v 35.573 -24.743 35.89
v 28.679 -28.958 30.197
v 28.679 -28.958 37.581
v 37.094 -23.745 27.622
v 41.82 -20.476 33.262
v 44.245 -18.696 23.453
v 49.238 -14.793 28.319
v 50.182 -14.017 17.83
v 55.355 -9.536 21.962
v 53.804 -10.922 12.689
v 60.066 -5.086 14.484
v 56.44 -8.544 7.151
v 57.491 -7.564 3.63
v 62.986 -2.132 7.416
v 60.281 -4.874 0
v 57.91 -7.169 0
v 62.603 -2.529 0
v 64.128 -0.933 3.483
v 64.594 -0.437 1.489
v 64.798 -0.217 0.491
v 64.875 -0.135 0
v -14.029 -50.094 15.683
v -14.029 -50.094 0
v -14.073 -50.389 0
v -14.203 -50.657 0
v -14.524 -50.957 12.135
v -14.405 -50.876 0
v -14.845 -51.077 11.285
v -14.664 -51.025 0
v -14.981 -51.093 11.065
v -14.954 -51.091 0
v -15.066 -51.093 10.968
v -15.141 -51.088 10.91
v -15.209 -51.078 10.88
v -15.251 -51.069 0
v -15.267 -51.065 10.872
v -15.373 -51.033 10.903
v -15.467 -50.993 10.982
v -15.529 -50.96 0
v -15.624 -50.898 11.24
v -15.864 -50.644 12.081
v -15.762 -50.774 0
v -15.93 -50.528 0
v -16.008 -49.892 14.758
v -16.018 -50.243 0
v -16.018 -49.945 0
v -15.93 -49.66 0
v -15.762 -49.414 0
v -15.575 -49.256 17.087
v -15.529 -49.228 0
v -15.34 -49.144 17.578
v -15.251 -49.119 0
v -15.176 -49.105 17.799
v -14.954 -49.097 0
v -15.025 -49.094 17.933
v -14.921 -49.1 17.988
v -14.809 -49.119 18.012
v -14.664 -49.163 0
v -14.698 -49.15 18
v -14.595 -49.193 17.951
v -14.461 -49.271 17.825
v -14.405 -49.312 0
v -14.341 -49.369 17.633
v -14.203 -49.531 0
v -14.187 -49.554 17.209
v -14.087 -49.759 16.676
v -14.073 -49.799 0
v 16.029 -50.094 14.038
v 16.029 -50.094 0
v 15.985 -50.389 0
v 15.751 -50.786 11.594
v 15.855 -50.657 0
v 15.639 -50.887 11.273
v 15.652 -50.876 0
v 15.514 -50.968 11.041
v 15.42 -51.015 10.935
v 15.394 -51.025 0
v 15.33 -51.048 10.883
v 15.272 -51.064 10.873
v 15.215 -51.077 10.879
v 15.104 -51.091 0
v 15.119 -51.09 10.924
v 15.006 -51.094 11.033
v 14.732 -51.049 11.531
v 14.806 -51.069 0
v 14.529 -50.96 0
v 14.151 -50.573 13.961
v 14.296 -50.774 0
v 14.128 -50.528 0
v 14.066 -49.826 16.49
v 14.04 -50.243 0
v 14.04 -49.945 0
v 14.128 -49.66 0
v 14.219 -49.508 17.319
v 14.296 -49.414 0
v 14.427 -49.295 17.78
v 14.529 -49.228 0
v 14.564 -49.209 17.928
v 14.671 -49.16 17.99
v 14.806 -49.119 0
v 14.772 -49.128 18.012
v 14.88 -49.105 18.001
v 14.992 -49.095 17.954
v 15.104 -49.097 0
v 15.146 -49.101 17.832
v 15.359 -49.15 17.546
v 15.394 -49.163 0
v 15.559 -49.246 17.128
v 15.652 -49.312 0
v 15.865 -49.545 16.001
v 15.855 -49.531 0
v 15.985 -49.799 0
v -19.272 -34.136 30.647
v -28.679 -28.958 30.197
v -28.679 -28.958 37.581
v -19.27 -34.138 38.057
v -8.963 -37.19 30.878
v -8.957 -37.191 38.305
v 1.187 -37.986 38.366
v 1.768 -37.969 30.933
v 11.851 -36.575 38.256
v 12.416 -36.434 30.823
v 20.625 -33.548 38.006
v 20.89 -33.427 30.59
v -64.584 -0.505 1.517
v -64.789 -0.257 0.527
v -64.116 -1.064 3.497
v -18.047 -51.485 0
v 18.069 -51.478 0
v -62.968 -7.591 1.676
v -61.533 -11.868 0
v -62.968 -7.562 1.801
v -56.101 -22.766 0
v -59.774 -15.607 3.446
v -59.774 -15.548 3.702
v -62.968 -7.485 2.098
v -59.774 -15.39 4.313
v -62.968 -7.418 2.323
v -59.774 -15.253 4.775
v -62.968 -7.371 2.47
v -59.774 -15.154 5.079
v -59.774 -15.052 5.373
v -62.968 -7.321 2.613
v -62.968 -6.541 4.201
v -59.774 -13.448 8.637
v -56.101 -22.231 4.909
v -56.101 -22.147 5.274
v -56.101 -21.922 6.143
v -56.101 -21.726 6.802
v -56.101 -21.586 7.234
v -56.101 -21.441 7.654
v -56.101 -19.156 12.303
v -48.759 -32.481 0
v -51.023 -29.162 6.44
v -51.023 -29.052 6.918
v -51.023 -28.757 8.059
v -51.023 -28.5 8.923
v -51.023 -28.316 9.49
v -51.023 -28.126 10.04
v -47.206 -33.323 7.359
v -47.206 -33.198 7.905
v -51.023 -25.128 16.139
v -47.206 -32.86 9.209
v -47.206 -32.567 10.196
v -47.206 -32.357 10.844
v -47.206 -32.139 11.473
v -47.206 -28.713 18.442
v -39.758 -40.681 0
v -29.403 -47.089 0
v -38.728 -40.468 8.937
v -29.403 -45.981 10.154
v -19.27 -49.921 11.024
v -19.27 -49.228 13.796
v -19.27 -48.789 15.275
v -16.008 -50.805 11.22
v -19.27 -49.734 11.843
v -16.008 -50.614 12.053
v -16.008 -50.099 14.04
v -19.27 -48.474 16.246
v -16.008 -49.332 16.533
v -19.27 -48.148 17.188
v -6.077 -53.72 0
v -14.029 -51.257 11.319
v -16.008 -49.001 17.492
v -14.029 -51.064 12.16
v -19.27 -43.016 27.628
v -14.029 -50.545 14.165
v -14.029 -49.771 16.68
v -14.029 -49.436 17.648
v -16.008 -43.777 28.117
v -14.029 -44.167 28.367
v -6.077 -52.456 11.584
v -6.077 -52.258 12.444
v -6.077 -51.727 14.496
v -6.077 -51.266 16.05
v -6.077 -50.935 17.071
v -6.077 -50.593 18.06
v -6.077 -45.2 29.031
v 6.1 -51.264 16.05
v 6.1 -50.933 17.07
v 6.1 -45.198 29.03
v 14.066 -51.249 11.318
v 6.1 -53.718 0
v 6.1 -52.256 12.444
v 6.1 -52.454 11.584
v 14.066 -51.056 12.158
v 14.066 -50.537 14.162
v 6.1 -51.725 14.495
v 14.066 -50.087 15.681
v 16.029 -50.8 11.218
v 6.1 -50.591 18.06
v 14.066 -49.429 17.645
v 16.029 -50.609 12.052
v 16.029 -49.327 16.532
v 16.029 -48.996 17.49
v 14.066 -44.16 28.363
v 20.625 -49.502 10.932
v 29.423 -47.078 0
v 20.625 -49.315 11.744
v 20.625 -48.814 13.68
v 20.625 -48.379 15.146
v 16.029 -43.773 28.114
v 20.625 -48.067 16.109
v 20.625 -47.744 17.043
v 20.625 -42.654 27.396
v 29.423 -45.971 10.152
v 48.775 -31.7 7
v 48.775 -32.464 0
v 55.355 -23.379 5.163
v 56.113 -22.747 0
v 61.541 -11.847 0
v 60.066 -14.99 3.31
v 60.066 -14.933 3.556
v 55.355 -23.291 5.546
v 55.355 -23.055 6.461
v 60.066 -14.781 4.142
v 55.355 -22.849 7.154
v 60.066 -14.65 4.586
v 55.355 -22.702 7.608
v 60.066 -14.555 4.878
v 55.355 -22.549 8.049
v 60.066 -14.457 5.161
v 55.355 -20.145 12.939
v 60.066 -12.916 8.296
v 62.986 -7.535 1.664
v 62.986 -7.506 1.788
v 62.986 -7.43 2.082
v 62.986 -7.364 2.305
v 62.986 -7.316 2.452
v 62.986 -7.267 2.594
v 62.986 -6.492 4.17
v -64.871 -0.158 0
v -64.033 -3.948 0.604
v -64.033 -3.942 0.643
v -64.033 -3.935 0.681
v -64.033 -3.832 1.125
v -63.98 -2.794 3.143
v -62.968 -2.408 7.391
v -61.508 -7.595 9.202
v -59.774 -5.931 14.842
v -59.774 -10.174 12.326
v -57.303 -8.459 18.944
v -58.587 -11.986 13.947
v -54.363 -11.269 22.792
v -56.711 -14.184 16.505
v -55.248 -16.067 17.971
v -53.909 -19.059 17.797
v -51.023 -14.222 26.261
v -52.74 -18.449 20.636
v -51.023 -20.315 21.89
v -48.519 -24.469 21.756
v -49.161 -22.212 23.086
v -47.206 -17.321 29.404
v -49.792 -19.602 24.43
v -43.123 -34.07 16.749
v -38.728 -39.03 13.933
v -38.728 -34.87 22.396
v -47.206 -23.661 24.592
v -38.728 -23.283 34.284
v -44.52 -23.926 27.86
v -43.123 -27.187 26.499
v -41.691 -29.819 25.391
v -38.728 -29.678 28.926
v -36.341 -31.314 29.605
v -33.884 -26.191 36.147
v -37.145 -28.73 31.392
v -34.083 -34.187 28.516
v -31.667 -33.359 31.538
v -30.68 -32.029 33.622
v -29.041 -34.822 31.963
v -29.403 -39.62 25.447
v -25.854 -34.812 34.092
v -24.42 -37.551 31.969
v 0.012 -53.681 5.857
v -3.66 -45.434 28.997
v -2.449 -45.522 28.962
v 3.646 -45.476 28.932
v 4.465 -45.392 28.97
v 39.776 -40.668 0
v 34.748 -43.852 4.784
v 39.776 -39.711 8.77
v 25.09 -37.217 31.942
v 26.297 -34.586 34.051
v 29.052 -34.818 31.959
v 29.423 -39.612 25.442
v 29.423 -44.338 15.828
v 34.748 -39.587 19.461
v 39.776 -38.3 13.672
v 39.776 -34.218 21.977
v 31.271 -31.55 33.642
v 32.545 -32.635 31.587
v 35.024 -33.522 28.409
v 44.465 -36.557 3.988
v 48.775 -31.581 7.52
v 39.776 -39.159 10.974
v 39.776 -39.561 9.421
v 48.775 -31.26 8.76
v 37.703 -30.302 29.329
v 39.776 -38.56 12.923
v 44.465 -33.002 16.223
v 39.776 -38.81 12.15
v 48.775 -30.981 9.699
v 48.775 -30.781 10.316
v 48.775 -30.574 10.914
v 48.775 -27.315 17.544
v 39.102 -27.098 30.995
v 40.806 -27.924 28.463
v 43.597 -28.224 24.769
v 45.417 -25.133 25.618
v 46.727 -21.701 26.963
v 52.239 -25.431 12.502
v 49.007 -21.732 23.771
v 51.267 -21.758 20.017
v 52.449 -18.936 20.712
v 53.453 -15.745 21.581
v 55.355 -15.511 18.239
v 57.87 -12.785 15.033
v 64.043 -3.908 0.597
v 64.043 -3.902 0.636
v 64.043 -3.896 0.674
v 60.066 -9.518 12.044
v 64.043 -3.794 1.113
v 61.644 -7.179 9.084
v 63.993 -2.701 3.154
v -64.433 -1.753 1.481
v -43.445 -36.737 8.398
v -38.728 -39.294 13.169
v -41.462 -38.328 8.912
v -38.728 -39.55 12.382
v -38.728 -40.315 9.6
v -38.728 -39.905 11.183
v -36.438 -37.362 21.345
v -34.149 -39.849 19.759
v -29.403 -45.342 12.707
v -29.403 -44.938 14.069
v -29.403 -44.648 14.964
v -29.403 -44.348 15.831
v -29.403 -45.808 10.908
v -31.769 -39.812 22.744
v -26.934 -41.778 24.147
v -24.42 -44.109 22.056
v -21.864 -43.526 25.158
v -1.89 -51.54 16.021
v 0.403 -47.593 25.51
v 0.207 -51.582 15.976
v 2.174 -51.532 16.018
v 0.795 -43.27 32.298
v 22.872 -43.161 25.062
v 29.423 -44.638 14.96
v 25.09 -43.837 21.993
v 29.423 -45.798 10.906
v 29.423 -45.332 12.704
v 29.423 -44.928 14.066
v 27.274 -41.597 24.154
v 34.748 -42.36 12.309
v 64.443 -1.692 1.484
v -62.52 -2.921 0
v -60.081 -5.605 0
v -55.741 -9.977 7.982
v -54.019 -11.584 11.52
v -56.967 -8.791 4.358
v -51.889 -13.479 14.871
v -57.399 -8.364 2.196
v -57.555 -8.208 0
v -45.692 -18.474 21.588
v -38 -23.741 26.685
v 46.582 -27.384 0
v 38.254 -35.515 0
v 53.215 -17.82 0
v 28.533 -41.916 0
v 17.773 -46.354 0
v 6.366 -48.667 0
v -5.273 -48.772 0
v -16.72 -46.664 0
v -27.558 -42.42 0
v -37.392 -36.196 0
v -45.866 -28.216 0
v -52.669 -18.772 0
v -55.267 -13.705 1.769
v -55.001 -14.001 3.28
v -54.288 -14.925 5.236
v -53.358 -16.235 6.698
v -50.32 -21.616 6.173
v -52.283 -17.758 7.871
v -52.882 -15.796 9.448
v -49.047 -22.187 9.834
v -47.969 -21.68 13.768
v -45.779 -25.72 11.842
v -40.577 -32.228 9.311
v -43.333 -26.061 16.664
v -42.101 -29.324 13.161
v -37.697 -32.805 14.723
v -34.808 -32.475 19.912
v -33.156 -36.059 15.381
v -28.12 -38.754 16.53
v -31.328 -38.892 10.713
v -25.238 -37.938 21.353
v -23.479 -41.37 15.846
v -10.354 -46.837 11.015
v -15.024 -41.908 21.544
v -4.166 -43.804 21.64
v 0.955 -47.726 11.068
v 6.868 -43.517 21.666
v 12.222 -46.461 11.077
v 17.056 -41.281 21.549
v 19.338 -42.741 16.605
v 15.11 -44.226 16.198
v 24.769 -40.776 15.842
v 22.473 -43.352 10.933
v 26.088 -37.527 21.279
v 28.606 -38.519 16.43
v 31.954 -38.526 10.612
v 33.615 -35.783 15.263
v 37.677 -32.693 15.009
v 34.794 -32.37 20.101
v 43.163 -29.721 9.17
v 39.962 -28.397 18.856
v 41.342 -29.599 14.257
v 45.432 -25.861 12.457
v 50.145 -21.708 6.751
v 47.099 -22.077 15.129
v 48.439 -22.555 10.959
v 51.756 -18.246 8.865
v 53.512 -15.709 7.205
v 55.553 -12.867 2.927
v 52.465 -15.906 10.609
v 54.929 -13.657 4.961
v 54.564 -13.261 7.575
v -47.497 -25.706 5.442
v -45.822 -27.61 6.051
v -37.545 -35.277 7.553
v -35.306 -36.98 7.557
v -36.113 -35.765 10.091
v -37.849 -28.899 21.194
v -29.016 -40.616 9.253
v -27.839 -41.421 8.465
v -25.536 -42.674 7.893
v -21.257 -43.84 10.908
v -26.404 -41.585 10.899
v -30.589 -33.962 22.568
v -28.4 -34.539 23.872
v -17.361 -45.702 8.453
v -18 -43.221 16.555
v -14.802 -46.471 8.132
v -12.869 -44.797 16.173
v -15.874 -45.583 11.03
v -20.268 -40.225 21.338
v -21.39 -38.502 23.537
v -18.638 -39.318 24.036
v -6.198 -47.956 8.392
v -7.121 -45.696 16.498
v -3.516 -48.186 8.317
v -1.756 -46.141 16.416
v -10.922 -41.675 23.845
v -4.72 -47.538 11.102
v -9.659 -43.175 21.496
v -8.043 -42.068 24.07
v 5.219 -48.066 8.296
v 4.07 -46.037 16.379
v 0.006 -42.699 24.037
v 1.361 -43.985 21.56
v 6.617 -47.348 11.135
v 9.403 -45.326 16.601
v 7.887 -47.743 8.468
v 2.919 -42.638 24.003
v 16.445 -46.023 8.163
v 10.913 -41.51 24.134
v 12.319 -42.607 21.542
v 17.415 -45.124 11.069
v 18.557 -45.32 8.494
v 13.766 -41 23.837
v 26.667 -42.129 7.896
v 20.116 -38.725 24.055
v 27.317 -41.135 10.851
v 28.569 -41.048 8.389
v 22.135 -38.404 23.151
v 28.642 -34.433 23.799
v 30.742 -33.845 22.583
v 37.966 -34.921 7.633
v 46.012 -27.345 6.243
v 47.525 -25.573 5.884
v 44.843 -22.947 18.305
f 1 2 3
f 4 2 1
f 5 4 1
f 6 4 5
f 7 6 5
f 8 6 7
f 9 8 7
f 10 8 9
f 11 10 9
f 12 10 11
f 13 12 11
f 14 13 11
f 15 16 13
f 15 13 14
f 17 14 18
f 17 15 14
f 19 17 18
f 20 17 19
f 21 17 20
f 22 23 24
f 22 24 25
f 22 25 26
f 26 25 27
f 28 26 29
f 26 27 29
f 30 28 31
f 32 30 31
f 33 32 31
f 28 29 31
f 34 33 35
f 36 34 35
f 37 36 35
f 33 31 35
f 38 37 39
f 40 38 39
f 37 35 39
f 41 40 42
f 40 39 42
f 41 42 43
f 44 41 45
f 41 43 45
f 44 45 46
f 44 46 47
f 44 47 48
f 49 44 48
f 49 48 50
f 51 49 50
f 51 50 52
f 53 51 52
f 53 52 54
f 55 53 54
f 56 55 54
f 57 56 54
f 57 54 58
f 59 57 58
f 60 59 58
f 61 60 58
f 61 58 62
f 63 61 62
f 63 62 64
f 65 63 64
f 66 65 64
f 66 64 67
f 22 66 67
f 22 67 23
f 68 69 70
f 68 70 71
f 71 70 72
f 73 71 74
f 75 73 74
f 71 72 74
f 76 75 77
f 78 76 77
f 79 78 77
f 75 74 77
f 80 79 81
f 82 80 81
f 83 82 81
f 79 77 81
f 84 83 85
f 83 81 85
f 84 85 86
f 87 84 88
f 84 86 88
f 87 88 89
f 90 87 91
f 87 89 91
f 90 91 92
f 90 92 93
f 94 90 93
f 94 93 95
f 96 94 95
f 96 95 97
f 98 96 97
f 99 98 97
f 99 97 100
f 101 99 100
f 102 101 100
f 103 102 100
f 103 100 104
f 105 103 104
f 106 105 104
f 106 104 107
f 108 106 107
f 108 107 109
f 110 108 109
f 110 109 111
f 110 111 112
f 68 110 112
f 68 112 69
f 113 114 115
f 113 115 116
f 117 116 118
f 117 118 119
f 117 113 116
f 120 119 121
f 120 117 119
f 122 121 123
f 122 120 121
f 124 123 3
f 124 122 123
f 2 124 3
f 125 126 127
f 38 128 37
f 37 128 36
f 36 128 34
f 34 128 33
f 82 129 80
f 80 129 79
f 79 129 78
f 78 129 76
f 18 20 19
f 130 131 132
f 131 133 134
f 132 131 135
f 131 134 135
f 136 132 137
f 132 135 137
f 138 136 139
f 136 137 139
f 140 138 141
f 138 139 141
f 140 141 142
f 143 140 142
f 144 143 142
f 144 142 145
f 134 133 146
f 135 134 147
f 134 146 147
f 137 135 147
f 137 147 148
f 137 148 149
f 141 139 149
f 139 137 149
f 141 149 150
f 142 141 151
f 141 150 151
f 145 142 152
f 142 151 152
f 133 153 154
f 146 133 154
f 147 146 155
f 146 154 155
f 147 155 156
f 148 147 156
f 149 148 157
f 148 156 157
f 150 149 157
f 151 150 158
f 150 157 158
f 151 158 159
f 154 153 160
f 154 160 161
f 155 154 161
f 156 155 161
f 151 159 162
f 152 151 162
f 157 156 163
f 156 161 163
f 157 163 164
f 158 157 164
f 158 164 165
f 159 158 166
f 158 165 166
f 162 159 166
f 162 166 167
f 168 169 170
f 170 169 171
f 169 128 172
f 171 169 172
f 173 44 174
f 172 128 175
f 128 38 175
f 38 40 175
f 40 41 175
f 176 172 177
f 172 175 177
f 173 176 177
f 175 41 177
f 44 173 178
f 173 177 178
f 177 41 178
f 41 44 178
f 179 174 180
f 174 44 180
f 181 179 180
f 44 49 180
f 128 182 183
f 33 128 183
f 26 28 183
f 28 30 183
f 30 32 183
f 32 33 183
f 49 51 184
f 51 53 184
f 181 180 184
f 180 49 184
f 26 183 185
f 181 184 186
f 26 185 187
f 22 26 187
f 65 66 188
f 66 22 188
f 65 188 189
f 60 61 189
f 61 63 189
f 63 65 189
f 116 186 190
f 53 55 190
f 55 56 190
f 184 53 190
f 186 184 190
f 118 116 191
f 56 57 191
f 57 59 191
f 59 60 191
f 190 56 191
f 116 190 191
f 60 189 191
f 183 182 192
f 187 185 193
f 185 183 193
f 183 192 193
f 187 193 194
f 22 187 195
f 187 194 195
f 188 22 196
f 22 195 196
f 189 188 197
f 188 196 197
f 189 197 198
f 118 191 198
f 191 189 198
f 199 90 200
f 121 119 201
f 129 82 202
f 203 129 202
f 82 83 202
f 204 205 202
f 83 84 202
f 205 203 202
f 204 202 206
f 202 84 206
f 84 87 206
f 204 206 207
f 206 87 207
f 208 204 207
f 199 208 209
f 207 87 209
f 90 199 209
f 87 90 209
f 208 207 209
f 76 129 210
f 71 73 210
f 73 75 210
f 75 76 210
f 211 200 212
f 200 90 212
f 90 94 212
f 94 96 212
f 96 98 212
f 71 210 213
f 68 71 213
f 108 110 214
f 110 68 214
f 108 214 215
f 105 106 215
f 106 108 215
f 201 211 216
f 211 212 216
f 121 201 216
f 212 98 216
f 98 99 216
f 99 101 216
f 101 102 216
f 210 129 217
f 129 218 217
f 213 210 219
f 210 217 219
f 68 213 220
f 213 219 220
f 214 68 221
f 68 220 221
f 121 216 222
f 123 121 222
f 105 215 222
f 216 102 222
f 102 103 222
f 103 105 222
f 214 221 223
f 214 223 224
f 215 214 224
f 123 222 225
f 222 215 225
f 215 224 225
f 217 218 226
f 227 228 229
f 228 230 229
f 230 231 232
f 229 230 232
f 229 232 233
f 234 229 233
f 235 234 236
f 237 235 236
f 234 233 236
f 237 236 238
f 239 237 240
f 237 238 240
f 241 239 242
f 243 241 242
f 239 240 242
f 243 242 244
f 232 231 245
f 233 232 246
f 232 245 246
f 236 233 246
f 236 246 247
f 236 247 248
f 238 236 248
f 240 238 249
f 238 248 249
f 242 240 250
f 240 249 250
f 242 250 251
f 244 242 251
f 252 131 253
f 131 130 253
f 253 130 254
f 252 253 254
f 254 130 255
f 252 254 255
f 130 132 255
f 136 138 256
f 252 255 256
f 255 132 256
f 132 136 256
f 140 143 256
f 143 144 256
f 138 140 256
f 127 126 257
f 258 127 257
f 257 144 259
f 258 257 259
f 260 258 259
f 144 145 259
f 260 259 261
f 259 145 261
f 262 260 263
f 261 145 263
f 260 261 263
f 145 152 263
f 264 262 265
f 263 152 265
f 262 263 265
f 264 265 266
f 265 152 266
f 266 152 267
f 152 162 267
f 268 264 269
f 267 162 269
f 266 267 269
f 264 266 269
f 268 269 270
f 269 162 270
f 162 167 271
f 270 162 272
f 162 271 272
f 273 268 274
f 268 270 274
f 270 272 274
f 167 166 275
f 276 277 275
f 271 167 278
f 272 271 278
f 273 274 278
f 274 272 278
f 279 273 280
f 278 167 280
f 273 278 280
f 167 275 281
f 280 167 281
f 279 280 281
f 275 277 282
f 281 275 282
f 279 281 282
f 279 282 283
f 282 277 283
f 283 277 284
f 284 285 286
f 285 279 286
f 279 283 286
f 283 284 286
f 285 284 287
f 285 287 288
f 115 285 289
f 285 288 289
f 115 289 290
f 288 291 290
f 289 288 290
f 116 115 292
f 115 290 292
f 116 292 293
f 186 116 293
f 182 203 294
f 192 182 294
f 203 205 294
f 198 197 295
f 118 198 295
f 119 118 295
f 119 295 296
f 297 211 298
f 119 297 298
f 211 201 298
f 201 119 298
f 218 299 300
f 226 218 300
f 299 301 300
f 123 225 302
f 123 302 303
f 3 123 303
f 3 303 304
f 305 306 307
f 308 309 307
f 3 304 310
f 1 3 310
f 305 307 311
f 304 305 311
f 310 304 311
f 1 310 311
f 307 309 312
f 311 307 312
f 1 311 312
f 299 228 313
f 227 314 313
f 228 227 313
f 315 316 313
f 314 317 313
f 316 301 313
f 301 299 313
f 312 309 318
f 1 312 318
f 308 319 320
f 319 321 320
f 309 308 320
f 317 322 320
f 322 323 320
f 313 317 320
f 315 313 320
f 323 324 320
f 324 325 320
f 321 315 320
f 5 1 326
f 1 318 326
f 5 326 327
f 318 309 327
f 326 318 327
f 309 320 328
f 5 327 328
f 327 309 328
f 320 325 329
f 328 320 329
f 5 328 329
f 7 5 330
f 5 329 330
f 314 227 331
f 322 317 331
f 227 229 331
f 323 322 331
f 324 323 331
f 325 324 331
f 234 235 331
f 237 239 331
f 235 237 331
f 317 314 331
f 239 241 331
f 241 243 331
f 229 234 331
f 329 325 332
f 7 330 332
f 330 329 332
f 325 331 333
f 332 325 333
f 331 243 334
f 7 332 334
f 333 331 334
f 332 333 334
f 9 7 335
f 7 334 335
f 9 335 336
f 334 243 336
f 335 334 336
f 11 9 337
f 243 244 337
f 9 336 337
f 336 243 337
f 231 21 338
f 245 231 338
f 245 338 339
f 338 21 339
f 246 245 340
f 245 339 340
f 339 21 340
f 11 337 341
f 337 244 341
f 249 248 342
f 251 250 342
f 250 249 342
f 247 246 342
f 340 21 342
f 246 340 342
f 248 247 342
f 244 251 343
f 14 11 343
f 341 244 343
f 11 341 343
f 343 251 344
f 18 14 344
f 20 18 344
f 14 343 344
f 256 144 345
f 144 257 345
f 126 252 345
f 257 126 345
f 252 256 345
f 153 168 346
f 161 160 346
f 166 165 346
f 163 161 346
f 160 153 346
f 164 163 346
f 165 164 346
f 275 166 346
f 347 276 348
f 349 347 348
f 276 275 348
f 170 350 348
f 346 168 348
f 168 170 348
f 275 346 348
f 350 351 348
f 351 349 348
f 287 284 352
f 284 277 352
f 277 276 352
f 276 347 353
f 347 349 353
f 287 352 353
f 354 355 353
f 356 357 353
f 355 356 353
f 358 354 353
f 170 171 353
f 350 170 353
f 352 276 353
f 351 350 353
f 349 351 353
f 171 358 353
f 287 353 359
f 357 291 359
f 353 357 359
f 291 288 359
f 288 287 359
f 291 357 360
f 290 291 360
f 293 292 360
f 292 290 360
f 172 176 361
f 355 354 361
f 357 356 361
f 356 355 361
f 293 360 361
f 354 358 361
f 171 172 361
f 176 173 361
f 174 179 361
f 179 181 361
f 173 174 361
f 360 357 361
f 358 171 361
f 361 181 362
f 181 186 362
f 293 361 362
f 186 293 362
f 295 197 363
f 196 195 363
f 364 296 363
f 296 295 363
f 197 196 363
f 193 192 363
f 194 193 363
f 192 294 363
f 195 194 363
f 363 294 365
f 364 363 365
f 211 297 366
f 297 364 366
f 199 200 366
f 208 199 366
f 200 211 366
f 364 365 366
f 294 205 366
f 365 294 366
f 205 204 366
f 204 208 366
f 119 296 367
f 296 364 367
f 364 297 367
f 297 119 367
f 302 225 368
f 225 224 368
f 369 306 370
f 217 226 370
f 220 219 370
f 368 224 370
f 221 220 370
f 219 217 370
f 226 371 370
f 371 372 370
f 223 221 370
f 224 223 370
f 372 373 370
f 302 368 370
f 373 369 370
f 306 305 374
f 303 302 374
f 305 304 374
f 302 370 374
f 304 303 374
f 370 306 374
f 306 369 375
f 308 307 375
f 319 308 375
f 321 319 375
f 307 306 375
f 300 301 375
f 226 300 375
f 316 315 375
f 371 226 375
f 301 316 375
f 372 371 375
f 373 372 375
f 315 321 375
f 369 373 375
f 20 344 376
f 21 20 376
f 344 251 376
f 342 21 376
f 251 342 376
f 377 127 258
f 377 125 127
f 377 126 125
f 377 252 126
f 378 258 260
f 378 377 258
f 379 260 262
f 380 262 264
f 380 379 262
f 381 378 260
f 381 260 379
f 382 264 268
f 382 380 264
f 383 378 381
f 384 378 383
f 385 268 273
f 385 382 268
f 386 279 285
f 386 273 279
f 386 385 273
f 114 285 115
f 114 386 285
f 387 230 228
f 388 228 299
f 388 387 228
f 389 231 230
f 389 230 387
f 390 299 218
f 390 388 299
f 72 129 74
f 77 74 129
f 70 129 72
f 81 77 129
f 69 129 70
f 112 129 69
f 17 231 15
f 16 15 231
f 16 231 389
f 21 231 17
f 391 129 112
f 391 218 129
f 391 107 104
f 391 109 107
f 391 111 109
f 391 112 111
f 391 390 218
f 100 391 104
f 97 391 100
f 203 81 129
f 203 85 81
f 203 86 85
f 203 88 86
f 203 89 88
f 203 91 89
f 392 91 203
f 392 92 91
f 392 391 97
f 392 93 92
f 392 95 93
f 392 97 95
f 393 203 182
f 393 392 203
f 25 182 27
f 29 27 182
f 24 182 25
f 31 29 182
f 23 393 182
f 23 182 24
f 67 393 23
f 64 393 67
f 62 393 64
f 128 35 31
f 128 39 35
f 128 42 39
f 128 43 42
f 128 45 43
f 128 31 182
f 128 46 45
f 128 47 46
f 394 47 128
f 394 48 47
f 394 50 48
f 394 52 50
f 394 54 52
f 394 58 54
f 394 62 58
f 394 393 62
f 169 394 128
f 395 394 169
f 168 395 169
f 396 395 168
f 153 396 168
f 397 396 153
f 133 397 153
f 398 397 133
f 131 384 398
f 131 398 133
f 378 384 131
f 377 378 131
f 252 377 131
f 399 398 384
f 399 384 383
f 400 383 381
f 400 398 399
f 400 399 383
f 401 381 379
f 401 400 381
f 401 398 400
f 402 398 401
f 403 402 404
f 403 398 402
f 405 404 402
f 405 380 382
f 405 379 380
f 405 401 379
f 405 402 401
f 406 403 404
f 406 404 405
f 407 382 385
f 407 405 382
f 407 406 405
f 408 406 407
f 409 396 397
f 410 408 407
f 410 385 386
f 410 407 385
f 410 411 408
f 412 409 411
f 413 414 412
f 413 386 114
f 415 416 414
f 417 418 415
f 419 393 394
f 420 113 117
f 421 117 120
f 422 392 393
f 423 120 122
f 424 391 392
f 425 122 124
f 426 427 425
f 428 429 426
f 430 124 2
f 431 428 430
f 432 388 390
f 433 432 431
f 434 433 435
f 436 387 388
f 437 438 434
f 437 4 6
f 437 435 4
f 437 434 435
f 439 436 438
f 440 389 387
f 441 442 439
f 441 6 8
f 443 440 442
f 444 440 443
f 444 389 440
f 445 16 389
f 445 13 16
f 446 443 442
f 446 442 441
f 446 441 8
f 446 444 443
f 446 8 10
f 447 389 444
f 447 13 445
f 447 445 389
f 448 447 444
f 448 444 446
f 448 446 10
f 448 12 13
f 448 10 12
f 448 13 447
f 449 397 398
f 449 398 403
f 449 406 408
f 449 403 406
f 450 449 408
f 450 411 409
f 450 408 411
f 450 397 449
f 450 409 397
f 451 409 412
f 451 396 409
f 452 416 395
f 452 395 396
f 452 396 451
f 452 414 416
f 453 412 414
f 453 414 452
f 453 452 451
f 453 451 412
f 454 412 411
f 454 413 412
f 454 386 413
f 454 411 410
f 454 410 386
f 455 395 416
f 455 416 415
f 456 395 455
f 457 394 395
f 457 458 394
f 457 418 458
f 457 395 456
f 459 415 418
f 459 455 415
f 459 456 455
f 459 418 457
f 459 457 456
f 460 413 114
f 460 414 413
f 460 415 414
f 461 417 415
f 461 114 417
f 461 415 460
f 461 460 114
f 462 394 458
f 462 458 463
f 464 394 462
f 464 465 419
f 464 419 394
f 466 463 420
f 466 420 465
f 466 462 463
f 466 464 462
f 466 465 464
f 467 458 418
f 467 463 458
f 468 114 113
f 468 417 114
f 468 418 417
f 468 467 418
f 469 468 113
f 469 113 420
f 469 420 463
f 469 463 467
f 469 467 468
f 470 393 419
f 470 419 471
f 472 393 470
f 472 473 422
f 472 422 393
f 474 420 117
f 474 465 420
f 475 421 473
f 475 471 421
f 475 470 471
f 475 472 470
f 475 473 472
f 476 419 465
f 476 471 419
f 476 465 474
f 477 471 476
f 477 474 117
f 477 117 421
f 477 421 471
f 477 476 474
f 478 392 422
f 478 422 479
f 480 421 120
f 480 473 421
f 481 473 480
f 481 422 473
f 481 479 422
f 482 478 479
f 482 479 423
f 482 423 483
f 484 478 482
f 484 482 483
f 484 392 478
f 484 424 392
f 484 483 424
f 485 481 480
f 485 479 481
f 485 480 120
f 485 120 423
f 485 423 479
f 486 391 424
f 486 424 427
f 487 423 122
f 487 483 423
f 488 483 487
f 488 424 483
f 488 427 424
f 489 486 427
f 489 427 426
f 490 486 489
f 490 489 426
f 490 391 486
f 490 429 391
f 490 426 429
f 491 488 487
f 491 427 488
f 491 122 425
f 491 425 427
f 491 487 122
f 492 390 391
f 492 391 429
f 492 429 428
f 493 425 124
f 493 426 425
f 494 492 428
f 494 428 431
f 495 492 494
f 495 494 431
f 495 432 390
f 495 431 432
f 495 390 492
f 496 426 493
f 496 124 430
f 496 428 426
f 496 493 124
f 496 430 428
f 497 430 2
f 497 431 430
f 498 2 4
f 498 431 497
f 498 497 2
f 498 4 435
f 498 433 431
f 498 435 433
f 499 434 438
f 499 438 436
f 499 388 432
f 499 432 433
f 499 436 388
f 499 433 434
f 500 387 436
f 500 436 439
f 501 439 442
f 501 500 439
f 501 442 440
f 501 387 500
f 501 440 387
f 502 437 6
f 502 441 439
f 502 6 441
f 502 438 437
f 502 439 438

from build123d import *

# Parameters (mm, degrees)
PAD_DEPTH        = 55
REVOLUTION_ANGLE = -90
SKETCH002_R      = 1
POCKET_DEPTH     = 38.367652


with BuildPart() as pad:
    # Sketch001 → Pad (new body)
    with BuildSketch(Plane.XY):
        with BuildLine():
            ThreePointArc((-28.678822, -28.957602), (0, -38), (28.678822, -28.957602))
            ThreePointArc((28.678822, -28.957602), (47.930354, -15.847158), (65, 0))
            Line((-65, 0), (65, 0))
            ThreePointArc((-65, 0), (-48.373276, -16.40271), (-28.678822, -28.957602))
        make_face()
    extrude(amount=PAD_DEPTH)


with BuildPart() as holesscrews:
    # Sketch → Revolution (revolve)
    with BuildSketch(Plane.XY):
        with BuildLine():
            ThreePointArc((-59.808026, 0), (0, -49), (59.808026, 0))
            Line((59.808026, 0), (64.899923, 0))
            ThreePointArc((-64.899923, 0), (0, -54), (64.899923, 0))
            Line((-64.899923, 0), (-59.808026, 0))
        make_face()
    revolve(axis=Axis((0, 0, 0), (1, 0, 0)), revolution_arc=REVOLUTION_ANGLE)

    # Cut: cut Pad
    add(pad.part, mode=Mode.SUBTRACT)

    # Sketch002 → Pocket (cut, through all)
    with BuildSketch(Plane(origin=(0, 0, 0), x_dir=(1, 0, 0), z_dir=(0, 0, -1))):
        with Locations((15.028955, 50.094116)):
            Circle(SKETCH002_R)
        with Locations((-15.028955, 50.094116)):
            Circle(SKETCH002_R)
    extrude(amount=-POCKET_DEPTH, mode=Mode.SUBTRACT)


solid = holesscrews.part
